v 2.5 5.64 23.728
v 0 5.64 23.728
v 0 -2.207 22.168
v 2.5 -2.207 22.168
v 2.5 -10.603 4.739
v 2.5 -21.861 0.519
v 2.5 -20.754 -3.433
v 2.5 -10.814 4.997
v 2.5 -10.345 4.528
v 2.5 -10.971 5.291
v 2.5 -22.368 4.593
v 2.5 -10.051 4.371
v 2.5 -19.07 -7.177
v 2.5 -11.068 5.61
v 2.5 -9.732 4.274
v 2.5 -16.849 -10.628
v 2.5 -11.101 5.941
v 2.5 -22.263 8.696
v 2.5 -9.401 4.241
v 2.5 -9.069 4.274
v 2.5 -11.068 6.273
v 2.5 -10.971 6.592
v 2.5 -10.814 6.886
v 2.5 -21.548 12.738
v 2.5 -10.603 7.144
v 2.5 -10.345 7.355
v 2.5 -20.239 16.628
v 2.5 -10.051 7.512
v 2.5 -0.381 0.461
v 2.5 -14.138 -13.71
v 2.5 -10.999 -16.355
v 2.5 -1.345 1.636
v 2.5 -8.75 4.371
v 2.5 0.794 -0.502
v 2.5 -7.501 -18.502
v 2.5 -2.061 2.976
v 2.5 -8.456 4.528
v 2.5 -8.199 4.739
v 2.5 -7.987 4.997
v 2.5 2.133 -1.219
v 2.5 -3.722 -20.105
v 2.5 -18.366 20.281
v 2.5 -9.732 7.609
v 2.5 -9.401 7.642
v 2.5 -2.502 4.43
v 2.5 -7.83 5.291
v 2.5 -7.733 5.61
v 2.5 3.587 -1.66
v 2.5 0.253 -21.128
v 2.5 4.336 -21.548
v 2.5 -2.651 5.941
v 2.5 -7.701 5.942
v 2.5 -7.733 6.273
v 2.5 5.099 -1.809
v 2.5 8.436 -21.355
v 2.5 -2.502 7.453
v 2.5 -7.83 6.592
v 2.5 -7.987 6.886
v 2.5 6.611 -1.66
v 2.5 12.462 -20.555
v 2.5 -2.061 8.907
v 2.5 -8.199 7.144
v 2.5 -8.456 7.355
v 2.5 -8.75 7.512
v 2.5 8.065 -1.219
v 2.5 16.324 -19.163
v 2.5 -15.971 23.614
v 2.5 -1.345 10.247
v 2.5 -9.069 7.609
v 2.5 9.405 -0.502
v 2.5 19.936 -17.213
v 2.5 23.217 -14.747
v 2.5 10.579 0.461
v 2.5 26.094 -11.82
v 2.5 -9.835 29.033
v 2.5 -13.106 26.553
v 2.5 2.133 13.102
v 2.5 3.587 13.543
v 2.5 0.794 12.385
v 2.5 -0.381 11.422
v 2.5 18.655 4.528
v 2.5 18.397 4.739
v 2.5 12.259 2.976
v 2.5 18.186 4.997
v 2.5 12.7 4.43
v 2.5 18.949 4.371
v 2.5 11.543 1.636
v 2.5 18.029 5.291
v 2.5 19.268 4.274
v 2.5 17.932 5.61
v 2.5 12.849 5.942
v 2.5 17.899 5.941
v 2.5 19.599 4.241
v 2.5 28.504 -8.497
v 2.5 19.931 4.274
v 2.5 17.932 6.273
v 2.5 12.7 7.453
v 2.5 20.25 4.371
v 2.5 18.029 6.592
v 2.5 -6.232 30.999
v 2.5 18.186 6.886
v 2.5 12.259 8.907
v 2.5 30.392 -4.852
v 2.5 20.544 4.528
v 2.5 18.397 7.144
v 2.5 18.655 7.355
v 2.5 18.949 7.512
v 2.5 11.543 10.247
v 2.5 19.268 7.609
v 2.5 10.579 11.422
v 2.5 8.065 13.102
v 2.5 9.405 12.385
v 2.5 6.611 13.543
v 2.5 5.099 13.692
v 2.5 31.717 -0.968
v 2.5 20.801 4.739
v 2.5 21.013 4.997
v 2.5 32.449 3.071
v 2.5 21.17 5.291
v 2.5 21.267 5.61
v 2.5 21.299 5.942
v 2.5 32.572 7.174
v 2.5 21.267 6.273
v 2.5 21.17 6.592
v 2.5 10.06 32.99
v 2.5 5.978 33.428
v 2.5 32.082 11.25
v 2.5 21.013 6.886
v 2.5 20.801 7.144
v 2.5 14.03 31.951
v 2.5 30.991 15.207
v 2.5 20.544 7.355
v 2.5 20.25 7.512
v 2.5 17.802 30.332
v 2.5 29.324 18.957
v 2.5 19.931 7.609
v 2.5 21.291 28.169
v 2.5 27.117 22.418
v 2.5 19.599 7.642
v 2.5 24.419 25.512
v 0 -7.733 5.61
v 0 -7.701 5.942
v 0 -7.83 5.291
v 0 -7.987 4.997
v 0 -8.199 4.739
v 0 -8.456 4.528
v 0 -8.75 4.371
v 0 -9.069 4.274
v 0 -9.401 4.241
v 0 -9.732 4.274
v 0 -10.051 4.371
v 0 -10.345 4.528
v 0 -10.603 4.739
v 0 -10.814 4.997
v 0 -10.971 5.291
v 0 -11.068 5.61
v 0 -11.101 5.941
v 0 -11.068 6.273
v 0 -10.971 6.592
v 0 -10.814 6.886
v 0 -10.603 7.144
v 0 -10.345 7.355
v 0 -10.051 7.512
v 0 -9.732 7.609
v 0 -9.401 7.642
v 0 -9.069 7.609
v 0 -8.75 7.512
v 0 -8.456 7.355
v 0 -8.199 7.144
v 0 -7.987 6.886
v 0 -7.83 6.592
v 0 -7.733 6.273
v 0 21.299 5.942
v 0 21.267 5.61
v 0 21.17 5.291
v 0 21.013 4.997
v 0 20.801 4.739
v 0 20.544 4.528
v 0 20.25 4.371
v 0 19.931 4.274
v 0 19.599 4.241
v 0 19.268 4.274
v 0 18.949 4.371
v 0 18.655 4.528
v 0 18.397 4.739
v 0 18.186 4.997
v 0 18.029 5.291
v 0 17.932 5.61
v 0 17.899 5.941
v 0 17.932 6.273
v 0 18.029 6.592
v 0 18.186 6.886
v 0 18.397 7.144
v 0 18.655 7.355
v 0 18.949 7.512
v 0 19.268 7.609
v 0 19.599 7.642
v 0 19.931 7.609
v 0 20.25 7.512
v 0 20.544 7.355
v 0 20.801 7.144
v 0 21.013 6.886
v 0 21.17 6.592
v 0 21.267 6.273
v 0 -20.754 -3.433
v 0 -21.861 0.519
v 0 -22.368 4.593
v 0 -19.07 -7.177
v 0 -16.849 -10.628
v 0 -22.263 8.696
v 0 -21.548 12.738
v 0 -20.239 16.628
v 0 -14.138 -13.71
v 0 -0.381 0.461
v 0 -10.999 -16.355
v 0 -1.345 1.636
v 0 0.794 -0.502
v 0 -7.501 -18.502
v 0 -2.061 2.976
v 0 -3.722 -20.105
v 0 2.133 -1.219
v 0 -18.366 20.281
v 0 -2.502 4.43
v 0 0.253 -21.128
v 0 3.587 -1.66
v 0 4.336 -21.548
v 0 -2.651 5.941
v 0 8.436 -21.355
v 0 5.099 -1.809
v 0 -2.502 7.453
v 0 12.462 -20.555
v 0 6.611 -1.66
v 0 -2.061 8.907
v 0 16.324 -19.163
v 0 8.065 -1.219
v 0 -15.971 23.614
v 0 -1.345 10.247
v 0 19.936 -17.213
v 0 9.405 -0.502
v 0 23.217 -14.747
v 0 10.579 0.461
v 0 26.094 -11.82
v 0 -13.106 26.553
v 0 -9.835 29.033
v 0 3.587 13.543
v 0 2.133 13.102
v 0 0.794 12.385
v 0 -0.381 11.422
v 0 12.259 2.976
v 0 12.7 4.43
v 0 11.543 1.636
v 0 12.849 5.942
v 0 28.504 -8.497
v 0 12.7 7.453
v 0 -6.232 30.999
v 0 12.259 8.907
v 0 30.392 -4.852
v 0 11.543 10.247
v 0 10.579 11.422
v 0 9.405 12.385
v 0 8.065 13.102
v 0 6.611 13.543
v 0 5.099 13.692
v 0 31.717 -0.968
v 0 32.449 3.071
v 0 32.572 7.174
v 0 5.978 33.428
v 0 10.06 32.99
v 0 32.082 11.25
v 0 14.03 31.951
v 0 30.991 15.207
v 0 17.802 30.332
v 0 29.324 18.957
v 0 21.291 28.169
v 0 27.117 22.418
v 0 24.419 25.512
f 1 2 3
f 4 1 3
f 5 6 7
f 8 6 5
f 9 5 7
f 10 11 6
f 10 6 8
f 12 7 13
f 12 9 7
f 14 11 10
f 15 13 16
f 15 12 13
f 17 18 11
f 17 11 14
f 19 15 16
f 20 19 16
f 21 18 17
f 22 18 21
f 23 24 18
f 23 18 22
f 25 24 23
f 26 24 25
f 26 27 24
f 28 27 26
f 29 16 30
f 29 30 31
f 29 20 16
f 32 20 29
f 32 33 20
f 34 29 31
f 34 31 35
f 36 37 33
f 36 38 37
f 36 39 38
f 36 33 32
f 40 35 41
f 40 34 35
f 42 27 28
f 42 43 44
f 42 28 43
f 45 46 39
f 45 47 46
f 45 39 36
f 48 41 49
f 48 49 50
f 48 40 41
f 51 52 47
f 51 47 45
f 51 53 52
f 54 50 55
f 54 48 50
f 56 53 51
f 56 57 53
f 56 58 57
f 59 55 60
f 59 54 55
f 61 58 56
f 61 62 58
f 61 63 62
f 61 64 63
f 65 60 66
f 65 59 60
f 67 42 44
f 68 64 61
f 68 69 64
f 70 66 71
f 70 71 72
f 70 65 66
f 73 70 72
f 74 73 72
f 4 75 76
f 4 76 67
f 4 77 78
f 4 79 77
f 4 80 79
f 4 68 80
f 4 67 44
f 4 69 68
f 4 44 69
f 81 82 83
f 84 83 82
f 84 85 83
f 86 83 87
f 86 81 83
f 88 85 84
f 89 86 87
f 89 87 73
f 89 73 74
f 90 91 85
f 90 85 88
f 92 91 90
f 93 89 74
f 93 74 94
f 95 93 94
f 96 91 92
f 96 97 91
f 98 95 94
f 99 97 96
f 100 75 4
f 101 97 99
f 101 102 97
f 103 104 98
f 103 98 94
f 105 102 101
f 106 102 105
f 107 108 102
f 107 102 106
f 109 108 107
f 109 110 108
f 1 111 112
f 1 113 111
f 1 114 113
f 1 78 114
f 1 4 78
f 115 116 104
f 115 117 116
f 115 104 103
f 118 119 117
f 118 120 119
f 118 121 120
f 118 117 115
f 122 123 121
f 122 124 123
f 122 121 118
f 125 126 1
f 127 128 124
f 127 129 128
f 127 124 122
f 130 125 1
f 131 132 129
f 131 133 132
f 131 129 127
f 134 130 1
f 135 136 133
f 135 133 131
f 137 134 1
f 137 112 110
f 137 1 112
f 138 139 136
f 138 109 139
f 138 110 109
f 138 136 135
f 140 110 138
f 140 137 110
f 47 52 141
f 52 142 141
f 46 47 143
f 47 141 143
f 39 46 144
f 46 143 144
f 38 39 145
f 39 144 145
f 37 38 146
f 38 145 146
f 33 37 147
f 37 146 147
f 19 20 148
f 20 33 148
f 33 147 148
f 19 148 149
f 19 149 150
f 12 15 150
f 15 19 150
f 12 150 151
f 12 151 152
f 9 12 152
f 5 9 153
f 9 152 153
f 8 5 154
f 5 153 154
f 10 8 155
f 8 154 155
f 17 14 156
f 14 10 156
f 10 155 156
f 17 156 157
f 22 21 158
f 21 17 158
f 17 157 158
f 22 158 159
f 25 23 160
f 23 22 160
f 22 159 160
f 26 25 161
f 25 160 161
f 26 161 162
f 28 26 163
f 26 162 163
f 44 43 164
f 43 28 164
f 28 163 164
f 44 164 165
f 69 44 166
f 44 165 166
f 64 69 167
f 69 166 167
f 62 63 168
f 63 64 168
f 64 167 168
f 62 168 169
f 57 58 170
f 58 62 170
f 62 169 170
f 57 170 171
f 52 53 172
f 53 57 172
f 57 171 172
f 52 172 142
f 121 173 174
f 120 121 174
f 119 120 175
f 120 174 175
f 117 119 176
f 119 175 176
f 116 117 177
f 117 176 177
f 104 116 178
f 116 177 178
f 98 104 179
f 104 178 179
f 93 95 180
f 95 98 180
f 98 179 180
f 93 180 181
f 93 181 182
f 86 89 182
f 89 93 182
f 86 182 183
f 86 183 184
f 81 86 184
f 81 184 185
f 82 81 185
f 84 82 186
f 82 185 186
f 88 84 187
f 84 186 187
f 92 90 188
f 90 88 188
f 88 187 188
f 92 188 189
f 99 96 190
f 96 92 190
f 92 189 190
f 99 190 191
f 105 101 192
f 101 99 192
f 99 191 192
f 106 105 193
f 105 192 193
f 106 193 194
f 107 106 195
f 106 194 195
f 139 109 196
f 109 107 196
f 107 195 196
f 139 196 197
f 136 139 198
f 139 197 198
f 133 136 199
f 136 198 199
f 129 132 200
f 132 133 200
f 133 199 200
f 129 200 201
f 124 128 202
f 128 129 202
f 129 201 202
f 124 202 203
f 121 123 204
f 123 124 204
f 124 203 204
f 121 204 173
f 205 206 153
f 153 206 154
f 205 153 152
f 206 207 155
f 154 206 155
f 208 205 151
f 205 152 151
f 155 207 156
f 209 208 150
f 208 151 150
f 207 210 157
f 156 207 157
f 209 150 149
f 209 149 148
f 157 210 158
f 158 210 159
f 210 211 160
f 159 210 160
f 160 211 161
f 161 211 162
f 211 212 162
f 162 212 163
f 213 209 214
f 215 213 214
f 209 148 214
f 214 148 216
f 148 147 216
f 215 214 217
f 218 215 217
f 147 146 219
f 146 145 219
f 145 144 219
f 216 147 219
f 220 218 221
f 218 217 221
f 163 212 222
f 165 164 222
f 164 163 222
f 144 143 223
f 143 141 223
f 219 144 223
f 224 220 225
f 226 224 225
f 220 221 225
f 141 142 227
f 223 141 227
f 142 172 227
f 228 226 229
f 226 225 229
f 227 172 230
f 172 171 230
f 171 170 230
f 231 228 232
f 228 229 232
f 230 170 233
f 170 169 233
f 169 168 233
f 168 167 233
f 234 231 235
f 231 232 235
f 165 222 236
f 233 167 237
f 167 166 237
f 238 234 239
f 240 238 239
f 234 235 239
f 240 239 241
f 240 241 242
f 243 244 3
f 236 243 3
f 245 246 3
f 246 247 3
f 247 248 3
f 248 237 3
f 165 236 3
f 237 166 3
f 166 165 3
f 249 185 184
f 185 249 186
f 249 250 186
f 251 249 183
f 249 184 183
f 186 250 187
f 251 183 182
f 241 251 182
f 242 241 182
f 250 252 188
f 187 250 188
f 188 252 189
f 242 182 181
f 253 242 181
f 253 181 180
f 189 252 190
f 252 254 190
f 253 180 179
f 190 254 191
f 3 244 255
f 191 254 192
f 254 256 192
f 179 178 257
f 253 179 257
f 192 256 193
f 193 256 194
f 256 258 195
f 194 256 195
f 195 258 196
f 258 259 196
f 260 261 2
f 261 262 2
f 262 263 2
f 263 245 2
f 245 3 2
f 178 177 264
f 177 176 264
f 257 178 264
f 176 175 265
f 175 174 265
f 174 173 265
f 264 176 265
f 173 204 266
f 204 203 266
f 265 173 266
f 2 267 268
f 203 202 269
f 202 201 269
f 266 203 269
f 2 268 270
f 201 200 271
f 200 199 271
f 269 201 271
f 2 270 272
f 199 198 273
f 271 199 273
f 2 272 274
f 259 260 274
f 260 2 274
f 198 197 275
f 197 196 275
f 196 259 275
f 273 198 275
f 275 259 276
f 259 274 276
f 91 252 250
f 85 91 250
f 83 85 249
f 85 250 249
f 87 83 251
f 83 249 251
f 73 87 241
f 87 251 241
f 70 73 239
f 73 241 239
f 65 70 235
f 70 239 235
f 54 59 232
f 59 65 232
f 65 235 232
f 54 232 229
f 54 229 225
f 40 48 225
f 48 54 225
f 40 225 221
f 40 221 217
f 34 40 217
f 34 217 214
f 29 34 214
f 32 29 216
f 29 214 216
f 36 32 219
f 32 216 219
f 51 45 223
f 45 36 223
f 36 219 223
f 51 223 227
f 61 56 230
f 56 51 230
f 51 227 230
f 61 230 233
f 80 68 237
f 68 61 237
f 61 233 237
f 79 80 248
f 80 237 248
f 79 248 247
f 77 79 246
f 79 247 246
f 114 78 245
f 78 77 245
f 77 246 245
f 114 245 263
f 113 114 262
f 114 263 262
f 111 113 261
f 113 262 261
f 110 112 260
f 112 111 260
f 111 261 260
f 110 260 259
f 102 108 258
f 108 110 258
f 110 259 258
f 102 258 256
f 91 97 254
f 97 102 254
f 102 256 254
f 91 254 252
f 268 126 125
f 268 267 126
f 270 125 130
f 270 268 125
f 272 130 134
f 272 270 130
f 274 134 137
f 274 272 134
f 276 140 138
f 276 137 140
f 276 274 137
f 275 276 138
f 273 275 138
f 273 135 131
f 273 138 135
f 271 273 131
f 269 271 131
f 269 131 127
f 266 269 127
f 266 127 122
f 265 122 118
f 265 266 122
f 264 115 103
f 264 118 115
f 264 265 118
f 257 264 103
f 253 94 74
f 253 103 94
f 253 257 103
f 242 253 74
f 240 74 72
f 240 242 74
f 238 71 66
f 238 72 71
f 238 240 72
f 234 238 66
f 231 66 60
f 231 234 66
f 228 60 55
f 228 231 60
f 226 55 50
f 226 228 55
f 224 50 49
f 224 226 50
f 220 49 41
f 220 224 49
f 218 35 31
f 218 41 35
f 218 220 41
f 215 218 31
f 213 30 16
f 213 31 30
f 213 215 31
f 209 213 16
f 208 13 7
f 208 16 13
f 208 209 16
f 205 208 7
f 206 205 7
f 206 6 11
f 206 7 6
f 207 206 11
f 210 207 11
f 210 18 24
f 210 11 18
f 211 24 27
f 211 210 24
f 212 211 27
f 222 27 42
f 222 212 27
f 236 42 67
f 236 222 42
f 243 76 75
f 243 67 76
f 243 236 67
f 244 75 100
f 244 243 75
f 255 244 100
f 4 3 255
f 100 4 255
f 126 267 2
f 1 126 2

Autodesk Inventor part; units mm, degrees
ref_plane "YZ Plane" through (0, 0, 0) normal (1, 0, 0) x (0, 1, 0)
ref_plane "XZ Plane" through (0, 0, 0) normal (0, 1, 0) x (-1, 0, 0)
ref_plane "XY Plane" through (0, 0, 0) normal (0, 0, 1) x (1, 0, 0)
sketch "スケッチ1" plane through (0, 0, 0) normal (1, 0, 0) x (0, 1, 0)
  circle A0 centre (19.5992, 5.9415) radius 1.7
  circle A1 centre (-9.4008, 5.9415) radius 1.7
  line L0 (-2.2068, 22.1678) -> (-6.2315, 30.9988)
  arc A2 (-6.2315, 30.9988) -> (5.9783, 33.4275) centre (5.0992, 5.9415) ccw
  line L1 (5.6395, 23.7285) -> (-2.2068, 22.1678)
  circle A3 centre (5.0992, 5.9415) radius 7.75
  line L2 (5.9783, 33.4275) -> (5.6395, 23.7285)
  point P0 (0, 0)
extrude "押し出し1" add sketch "スケッチ1" along normal blind 2.5
properties part number "belt_liner_v2_3DP_P-2-F" material "ABS プラスチック"
